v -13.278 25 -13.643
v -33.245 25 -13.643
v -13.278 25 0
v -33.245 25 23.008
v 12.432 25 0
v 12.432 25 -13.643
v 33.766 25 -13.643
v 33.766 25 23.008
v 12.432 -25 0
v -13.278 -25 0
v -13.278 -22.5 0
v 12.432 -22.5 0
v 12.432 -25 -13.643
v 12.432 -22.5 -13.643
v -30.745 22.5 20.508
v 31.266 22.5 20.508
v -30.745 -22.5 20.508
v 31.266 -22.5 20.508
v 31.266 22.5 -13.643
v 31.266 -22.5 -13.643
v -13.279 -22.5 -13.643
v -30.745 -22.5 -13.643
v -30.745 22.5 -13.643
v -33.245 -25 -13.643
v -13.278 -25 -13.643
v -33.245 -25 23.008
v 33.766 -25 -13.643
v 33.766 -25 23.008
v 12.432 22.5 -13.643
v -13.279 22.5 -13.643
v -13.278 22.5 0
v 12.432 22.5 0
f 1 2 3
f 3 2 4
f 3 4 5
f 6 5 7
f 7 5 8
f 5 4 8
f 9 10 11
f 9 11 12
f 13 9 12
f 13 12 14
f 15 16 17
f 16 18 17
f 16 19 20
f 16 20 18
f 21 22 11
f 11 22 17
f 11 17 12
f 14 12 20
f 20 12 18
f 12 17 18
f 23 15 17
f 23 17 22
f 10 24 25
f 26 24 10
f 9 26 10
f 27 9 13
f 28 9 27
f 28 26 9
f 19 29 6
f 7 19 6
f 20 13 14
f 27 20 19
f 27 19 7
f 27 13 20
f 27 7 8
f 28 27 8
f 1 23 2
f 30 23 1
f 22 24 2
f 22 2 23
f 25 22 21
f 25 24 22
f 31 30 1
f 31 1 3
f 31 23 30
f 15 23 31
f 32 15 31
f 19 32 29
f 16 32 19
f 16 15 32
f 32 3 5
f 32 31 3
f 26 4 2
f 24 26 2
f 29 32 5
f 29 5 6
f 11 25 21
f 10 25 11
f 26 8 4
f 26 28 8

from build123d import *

# Parameters (mm, degrees)
F1_DEPTH = 25
F2_T     = -2.5


with BuildPart() as f1:
    # F0 (on Front) → F1 (new body, symmetric)
    with BuildSketch(Plane.XZ):
        Polygon((33.765722, 23.008151), (-33.244941, 23.008151), (-33.244941, -13.642579), (-13.2785, -13.642579), (-13.2785, 0), (12.431712, 0), (12.431712, -13.642579), (33.765722, -13.642579), align=None)
    extrude(amount=F1_DEPTH, both=True)

    # F2
    f2_openings = [f1.faces().sort_by_distance(p)[0] for p in [
        (-0.423394, 0, 0),
        (23.098717, 0, -13.642579),
        (-23.261721, 0, -13.642579),
        (-13.2785, 0, -6.82129),
        (12.431712, 0, -6.82129),
    ]]
    offset(amount=F2_T, openings=f2_openings)


solid = f1.part
